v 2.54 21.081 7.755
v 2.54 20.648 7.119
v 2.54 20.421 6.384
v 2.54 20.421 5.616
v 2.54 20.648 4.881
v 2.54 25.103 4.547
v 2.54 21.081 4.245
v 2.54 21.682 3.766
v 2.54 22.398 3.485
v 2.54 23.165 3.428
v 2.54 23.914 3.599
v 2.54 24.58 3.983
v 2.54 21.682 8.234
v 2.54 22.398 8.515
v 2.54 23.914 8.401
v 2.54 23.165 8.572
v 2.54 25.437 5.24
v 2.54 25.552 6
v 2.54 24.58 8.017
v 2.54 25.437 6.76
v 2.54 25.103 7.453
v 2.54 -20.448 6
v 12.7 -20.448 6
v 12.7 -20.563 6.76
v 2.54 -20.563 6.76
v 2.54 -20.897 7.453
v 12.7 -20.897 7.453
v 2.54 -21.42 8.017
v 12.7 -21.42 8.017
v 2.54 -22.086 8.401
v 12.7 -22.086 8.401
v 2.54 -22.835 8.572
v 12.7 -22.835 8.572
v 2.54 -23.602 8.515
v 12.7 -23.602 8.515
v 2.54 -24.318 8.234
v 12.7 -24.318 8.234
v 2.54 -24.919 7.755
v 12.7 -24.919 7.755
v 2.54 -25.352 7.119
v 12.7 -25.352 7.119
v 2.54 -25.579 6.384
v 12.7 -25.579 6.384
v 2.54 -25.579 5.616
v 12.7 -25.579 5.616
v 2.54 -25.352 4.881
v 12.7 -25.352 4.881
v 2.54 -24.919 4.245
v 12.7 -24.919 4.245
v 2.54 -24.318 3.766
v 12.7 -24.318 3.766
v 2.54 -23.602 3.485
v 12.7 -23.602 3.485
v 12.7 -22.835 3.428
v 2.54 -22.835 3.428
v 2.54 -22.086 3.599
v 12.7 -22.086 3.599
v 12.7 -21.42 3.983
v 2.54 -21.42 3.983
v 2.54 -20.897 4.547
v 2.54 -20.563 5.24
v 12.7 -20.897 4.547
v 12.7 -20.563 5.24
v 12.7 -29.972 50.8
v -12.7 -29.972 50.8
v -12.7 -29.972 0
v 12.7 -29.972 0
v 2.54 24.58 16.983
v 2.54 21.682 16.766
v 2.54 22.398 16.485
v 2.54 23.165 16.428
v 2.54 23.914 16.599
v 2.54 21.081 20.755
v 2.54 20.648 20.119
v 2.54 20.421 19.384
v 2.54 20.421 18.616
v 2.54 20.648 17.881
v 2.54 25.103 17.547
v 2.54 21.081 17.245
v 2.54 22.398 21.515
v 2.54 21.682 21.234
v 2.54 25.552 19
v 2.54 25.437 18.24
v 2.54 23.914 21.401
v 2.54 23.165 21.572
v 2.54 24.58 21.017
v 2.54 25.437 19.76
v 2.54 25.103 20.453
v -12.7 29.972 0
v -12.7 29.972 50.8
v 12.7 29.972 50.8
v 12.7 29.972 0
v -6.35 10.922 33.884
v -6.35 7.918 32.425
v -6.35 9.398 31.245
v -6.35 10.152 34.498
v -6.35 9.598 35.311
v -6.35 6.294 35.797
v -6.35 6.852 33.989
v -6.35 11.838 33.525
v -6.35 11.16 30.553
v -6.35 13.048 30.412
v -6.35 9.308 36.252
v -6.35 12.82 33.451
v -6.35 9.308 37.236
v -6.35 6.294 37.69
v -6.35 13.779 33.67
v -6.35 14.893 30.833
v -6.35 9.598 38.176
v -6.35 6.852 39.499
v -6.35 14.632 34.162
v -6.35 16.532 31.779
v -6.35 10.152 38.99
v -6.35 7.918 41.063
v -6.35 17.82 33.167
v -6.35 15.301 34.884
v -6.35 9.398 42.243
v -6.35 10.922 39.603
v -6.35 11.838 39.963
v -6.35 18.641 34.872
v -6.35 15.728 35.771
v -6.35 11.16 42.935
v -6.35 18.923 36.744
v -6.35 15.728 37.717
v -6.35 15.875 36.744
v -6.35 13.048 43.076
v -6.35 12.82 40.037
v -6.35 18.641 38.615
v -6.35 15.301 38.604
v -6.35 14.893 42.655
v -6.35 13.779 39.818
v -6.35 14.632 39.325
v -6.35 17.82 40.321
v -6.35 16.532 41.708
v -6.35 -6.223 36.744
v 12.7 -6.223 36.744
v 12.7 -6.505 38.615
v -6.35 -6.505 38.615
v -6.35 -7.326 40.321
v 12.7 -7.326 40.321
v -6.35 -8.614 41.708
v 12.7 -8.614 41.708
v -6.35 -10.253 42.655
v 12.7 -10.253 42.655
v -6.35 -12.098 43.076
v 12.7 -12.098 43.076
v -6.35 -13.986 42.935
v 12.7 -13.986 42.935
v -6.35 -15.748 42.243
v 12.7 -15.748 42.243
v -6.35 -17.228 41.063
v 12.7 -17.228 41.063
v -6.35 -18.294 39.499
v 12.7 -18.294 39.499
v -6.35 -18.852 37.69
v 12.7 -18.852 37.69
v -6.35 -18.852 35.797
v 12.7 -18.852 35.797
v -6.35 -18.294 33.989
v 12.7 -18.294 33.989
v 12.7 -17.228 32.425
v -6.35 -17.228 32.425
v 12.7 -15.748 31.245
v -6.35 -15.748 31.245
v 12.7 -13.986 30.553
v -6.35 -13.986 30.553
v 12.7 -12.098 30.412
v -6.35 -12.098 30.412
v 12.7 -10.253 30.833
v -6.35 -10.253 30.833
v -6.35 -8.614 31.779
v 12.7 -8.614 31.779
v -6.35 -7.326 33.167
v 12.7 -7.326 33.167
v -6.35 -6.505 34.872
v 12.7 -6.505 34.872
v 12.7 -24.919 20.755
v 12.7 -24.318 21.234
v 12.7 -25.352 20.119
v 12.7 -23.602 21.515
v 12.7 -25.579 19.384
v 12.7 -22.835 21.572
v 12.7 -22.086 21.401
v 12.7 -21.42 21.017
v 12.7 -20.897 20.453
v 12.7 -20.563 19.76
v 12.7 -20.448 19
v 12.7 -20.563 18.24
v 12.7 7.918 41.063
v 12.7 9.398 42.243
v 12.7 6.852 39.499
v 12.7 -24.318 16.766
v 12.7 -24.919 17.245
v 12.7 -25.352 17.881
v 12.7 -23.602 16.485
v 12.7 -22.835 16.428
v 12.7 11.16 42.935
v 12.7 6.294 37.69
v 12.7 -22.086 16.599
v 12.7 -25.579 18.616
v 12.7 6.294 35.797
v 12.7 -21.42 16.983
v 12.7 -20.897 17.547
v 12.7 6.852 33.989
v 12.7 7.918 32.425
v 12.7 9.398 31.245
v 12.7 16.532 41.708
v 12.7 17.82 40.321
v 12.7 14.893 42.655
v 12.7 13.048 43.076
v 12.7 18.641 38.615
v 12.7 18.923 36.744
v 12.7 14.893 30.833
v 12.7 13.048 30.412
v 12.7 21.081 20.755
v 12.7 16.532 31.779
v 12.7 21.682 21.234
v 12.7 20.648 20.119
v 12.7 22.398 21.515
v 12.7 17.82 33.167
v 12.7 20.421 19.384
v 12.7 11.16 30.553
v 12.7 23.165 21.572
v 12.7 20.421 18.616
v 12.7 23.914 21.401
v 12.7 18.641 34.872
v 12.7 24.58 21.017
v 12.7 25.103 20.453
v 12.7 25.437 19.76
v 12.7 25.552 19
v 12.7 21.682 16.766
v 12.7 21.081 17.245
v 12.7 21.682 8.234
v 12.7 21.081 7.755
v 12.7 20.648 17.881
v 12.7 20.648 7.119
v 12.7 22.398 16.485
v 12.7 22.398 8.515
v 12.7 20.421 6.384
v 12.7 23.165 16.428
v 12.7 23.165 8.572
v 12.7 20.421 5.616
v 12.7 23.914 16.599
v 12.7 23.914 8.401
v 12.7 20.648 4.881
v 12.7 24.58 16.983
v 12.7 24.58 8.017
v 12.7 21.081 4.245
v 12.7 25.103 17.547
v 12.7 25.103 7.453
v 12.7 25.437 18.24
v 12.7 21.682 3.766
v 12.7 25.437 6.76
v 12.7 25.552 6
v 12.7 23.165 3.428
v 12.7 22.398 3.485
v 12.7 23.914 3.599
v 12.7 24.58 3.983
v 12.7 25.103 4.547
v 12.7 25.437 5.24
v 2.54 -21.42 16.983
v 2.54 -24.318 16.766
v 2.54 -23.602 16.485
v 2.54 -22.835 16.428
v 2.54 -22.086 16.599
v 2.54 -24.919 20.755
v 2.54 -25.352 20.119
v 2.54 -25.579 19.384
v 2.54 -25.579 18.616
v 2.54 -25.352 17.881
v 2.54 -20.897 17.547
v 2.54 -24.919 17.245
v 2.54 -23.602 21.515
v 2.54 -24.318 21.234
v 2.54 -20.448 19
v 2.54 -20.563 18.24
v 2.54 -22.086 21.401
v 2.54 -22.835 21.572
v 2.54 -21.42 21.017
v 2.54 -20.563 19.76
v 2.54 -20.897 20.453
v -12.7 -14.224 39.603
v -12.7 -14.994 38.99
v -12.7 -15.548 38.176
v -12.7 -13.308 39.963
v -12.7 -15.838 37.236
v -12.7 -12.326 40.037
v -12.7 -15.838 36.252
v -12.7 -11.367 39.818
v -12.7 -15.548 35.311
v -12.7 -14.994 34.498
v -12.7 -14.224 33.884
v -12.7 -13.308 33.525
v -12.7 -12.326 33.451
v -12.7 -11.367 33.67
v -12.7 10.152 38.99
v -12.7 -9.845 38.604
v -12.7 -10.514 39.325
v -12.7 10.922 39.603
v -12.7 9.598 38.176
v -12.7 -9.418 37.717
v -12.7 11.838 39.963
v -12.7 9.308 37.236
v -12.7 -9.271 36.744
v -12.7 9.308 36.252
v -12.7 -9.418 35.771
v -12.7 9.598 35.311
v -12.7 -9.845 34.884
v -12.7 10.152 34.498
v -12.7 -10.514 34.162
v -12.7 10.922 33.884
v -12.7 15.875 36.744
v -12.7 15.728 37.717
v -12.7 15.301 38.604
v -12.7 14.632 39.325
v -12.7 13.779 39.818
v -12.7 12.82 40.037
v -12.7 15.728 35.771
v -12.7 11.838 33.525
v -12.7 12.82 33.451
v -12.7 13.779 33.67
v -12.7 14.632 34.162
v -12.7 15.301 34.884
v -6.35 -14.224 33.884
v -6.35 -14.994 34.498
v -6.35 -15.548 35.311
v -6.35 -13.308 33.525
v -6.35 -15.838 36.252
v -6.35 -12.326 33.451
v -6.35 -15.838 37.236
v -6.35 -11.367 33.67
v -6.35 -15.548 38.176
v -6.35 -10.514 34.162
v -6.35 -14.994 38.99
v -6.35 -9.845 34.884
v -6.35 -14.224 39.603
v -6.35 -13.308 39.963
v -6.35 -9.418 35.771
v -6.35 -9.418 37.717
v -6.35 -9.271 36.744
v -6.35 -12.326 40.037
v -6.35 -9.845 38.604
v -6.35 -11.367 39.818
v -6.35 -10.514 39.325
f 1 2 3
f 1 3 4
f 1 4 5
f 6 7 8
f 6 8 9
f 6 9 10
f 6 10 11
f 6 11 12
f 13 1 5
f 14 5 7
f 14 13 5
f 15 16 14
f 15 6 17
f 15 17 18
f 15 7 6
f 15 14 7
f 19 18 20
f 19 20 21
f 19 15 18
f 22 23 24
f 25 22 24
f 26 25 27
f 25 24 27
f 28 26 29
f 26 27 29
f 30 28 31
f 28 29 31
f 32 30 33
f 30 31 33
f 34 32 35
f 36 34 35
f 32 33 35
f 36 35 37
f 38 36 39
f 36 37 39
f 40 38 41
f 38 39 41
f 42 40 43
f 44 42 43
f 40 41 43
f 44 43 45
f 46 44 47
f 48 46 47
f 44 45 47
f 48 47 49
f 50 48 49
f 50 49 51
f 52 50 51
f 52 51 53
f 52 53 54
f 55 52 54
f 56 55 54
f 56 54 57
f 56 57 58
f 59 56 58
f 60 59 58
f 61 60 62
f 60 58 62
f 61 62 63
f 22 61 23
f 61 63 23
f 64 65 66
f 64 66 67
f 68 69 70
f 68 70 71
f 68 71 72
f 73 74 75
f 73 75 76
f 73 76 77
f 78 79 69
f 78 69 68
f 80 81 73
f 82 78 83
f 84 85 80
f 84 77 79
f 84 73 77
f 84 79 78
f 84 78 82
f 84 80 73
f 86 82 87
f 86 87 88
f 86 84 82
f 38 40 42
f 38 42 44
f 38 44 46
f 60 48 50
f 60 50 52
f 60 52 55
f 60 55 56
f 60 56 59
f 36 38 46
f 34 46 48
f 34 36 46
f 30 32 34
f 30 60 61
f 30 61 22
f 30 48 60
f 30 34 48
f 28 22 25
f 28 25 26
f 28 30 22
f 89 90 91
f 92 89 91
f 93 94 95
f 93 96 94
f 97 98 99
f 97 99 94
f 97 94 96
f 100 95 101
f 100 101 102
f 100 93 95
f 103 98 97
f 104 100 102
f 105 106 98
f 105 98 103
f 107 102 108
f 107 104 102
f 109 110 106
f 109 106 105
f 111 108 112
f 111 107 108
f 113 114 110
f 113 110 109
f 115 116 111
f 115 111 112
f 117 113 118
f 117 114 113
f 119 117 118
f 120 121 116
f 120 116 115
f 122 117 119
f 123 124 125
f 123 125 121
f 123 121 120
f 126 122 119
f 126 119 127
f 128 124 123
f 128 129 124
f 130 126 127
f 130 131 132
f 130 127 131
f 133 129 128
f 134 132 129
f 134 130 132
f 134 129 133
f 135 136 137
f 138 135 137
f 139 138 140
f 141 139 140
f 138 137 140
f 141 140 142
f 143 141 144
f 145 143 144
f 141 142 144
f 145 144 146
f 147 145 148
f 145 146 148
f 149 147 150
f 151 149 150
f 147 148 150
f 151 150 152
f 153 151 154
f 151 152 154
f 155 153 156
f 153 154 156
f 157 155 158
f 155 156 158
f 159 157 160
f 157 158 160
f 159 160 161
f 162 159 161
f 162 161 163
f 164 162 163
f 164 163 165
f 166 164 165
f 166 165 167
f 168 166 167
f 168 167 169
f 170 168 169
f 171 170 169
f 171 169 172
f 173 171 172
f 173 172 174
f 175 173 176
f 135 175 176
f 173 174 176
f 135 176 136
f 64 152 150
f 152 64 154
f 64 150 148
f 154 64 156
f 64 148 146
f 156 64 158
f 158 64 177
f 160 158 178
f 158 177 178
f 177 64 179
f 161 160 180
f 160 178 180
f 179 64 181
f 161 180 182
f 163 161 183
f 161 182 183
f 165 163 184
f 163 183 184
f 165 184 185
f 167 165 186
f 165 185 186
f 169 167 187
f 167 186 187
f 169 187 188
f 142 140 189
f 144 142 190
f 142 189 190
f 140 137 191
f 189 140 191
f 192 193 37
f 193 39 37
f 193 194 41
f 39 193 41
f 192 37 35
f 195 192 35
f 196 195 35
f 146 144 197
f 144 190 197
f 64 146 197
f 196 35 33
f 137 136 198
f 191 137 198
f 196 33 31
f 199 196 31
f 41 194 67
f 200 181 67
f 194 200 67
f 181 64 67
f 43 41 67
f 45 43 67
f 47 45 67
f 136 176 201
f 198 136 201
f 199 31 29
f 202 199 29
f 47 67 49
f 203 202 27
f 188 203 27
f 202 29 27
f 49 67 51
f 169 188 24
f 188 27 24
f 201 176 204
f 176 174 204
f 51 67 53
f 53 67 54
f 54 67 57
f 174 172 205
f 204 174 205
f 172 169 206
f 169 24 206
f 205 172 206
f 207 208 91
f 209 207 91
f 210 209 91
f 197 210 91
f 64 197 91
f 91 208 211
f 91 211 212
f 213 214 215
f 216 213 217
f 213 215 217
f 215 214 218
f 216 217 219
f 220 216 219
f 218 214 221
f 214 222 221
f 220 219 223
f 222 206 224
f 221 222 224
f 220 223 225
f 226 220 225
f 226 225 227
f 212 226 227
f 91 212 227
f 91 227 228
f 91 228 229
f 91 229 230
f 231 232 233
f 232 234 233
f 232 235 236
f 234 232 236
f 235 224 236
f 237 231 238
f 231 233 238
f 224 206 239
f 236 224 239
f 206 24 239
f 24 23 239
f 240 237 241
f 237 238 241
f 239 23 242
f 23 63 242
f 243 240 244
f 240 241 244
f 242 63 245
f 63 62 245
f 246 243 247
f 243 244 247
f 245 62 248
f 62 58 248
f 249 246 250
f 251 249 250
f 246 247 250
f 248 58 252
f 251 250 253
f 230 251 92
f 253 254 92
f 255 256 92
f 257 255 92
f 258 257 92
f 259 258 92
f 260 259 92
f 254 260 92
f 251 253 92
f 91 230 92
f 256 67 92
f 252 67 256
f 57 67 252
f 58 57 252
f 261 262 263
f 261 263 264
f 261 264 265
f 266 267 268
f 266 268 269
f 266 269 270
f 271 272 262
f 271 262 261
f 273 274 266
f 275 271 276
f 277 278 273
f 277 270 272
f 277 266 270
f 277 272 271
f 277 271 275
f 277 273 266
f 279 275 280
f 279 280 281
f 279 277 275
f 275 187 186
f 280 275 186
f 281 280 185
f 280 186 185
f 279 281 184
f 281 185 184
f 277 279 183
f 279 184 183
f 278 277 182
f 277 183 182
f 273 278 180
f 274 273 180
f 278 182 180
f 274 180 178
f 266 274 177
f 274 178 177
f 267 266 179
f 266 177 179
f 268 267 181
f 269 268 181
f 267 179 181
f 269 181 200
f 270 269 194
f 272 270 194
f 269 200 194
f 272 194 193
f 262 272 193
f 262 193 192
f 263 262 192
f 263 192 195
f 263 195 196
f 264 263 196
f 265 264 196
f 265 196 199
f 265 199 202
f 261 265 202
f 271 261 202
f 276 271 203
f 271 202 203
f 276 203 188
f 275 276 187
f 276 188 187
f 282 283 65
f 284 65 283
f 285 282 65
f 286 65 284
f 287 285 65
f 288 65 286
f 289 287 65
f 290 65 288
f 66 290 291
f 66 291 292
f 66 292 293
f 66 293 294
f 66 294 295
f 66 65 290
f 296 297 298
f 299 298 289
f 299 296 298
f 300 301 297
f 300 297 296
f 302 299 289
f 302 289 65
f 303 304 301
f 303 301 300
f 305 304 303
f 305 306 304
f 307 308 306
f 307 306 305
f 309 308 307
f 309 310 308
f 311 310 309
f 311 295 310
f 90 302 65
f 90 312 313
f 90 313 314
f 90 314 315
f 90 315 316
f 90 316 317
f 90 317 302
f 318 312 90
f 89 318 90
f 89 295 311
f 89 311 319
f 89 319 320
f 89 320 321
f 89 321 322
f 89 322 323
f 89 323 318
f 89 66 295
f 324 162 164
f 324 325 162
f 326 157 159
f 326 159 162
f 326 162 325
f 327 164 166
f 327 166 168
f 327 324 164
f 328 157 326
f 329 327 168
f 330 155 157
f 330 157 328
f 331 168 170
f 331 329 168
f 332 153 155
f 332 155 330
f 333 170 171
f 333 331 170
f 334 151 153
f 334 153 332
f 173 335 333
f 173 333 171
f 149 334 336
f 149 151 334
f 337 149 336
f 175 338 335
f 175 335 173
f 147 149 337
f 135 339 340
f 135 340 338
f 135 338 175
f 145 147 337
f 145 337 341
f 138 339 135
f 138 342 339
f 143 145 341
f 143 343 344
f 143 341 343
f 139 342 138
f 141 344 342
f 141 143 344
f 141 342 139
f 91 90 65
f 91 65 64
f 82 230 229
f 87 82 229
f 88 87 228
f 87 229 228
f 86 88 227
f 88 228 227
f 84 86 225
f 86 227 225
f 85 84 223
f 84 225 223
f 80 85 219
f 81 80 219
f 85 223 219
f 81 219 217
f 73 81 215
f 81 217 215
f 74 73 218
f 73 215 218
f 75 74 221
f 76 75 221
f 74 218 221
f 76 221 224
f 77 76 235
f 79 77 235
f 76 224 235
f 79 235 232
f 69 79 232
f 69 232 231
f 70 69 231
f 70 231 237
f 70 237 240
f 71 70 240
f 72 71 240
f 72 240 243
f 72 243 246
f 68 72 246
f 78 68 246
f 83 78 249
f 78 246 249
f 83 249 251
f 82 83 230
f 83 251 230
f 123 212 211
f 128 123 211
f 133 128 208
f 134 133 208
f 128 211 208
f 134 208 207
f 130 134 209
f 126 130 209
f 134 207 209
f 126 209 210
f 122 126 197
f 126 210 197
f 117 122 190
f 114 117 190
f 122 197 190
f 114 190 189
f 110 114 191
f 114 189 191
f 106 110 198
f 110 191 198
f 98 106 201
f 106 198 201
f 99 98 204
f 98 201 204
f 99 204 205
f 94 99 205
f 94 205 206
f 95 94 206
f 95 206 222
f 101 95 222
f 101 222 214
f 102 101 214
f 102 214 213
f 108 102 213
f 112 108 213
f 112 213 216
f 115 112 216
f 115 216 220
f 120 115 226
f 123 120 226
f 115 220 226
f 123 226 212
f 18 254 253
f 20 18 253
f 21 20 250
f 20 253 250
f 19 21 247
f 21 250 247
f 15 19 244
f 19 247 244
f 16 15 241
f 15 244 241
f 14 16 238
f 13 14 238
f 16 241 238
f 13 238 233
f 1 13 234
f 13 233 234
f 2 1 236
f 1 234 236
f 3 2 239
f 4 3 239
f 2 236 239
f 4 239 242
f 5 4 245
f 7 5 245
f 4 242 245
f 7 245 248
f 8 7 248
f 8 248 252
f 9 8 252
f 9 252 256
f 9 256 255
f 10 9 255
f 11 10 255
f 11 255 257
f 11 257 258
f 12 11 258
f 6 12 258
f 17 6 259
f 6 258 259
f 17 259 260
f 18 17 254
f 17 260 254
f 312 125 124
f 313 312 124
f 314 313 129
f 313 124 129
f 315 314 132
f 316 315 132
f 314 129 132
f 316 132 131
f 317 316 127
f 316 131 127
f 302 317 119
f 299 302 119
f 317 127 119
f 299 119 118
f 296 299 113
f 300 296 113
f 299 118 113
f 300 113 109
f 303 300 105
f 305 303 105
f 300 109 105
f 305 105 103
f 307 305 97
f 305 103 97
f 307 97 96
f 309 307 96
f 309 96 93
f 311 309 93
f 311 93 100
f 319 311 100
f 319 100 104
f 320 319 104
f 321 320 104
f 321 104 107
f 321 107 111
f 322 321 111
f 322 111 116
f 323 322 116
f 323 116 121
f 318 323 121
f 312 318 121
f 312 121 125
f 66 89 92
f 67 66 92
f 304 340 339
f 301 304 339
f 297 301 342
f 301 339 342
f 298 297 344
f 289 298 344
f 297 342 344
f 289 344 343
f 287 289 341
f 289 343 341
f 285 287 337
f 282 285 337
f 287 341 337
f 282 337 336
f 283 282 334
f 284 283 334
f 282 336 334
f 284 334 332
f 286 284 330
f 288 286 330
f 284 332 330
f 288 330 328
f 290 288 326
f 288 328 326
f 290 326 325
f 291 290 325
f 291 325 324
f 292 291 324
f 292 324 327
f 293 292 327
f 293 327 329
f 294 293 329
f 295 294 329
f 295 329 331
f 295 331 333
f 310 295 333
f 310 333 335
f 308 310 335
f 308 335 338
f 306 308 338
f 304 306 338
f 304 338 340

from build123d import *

# Parameters (mm, degrees)
SKETCH1_W           = 25.4
SKETCH1_H           = 59.944
BOSS_EXTRUDE1_DEPTH = 50.8
SKETCH2_OUTSIDE_W   = 69.316
SKETCH2_OUTSIDE_H   = 78.46
SKETCH2_OUTSIDE_W_2 = 50.8
SKETCH2_OUTSIDE_H_2 = 59.944
SKETCH2_OUTSIDE_R   = 2.5796875
CUT_EXTRUDE1_DEPTH  = 10.16
CUT_EXTRUDE2_REACH  = 66.219
SKETCH3_R           = 3.302
SKETCH4_R           = 6.35
CUT_EXTRUDE3_DEPTH  = 19.05


with BuildPart() as part:
    # Sketch1 → Boss-Extrude1 (new body)
    with BuildSketch(Plane.XY):
        Rectangle(SKETCH1_W, SKETCH1_H)
    extrude(amount=BOSS_EXTRUDE1_DEPTH)

    # Sketch2 outside → Cut-Extrude1 (cut)
    # profile 1 of 5: a face of its own
    with BuildSketch(Plane(origin=(12.7, 0, 0), x_dir=(0, 0, -1), z_dir=(1, 0, 0))):
        with Locations((-25.4, 0)):
            Rectangle(SKETCH2_OUTSIDE_W, SKETCH2_OUTSIDE_H)
        with Locations((-25.4, 0)):
            Rectangle(SKETCH2_OUTSIDE_W_2, SKETCH2_OUTSIDE_H_2, mode=Mode.SUBTRACT)
    # profile 2 of 5: a face of its own
    with BuildSketch(Plane(origin=(12.7, 0, 0), x_dir=(0, 0, -1), z_dir=(1, 0, 0))):
        with Locations(Location((-19, 22.972, 0), (0, 0, 90))):
            Circle(SKETCH2_OUTSIDE_R)
    # profile 3 of 5: a face of its own
    with BuildSketch(Plane(origin=(12.7, 0, 0), x_dir=(0, 0, -1), z_dir=(1, 0, 0))):
        with Locations(Location((-6, 22.972, 0), (0, 0, 90))):
            Circle(SKETCH2_OUTSIDE_R)
    # profile 4 of 5: a face of its own
    with BuildSketch(Plane(origin=(12.7, 0, 0), x_dir=(0, 0, -1), z_dir=(1, 0, 0))):
        with Locations(Location((-19, -23.028, 0), (0, 0, 90))):
            Circle(SKETCH2_OUTSIDE_R)
    # profile 5 of 5: a face of its own
    with BuildSketch(Plane(origin=(12.7, 0, 0), x_dir=(0, 0, -1), z_dir=(1, 0, 0))):
        with Locations(Location((-6, -23.028, 0), (0, 0, 90))):
            Circle(SKETCH2_OUTSIDE_R)
    extrude(amount=-CUT_EXTRUDE1_DEPTH, mode=Mode.SUBTRACT)

    # Sketch3 → Cut-Extrude2 (cut, up to next)
    with BuildSketch(Plane(origin=(12.7, 0, 0), x_dir=(0, 0, -1), z_dir=(1, 0, 0)), mode=Mode.PRIVATE) as cut_extrude2_sk1:
        with Locations(Location((-36.743794207, 12.573, 0), (0, 0, 90))):
            Circle(SKETCH3_R)
    cut_extrude2_tool1 = extrude(cut_extrude2_sk1.sketch, amount=-CUT_EXTRUDE2_REACH, mode=Mode.PRIVATE) & part.part
    # Sketch3 → Cut-Extrude2 (cut, up to next)
    with BuildSketch(Plane(origin=(12.7, 0, 0), x_dir=(0, 0, -1), z_dir=(1, 0, 0)), mode=Mode.PRIVATE) as cut_extrude2_sk2:
        with Locations(Location((-36.743794207, -12.573, 0), (0, 0, 90))):
            Circle(SKETCH3_R)
    cut_extrude2_tool2 = extrude(cut_extrude2_sk2.sketch, amount=-CUT_EXTRUDE2_REACH, mode=Mode.PRIVATE) & part.part
    add(cut_extrude2_tool1.solids().sort_by_distance((12.7, 12.573, 36.743794))[0], mode=Mode.SUBTRACT)
    add(cut_extrude2_tool2.solids().sort_by_distance((12.7, -12.573, 36.743794))[0], mode=Mode.SUBTRACT)

    # Sketch4 → Cut-Extrude3 (cut)
    with BuildSketch(Plane(origin=(12.7, 0, 0), x_dir=(0, 0, -1), z_dir=(1, 0, 0))):
        with Locations(Location((-36.743794207, 12.573, 0), (0, 0, 90))):
            Circle(SKETCH4_R)
        with Locations(Location((-36.743794207, -12.573, 0), (0, 0, 90))):
            Circle(SKETCH4_R)
    extrude(amount=-CUT_EXTRUDE3_DEPTH, mode=Mode.SUBTRACT)


solid = part.part
